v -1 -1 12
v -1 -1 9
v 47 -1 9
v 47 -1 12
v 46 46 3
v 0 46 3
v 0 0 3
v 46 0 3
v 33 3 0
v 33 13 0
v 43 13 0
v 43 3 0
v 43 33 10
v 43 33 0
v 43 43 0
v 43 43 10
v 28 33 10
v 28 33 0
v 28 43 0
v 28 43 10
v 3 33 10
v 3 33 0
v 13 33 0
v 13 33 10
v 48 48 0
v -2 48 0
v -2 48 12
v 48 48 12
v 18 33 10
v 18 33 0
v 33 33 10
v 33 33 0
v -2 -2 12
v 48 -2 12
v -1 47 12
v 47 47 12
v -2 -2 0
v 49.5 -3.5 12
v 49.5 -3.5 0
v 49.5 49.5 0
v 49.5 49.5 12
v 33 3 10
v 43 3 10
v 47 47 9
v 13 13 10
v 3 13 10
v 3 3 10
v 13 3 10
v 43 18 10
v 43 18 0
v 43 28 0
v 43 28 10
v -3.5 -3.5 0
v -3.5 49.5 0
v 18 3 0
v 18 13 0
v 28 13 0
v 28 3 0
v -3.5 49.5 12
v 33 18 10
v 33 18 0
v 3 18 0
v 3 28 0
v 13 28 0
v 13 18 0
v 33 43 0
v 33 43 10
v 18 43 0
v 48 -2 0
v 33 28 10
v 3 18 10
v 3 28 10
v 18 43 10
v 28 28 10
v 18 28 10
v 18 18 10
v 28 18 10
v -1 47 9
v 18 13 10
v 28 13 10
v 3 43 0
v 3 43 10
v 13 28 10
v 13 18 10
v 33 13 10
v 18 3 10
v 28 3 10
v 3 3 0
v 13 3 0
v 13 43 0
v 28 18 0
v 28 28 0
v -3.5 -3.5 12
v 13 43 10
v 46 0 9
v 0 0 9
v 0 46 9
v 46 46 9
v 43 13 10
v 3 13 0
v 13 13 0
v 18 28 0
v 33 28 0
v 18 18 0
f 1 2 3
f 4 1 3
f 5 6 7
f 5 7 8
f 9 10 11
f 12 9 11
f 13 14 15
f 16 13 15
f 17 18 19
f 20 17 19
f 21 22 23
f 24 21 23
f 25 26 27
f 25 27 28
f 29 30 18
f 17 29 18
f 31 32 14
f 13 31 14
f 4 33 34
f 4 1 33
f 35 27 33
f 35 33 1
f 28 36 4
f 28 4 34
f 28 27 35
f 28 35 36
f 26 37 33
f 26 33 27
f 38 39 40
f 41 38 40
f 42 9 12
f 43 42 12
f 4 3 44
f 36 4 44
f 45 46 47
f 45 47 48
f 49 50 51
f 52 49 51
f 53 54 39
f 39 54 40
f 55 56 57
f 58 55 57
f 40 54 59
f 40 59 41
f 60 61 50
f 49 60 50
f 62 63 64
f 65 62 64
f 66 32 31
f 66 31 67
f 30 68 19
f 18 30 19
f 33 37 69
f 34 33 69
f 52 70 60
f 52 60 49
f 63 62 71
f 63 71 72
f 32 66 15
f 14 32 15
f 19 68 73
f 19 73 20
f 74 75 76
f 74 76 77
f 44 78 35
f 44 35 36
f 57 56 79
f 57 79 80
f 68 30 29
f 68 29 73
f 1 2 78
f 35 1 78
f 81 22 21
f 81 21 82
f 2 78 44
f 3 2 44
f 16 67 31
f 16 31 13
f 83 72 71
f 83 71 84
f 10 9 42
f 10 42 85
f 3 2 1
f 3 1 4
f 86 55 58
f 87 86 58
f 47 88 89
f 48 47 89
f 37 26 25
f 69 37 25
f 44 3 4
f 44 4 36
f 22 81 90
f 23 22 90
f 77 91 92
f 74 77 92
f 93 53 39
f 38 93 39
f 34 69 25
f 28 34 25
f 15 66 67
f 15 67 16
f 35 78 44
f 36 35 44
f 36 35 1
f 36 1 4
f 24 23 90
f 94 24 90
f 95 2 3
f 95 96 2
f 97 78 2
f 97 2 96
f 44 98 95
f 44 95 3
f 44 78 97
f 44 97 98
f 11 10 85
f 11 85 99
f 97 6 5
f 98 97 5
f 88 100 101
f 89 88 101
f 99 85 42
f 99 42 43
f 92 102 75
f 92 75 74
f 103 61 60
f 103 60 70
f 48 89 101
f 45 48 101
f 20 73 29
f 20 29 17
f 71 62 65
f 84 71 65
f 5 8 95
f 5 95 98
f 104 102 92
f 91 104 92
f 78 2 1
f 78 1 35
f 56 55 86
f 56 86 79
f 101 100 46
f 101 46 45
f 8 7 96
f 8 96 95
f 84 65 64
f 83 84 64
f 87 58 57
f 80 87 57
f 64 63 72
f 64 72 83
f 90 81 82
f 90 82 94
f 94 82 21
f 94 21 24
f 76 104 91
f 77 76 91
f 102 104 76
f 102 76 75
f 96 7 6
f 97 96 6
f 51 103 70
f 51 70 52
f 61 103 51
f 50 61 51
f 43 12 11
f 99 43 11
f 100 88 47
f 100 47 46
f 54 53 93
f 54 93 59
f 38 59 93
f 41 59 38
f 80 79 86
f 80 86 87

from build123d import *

# Parameters (mm, degrees)
BOX001_W     = 10
BOX001_H     = 10
BOX001_DEPTH = 10
BOX002_W     = 10
BOX002_H     = 10
BOX002_DEPTH = 10
BOX003_W     = 10
BOX003_H     = 10
BOX003_DEPTH = 10
BOX004_W     = 10
BOX004_H     = 10
BOX004_DEPTH = 10
BOX005_W     = 10
BOX005_H     = 10
BOX005_DEPTH = 10
BOX006_W     = 10
BOX006_H     = 10
BOX006_DEPTH = 10
BOX007_W     = 10
BOX007_H     = 10
BOX007_DEPTH = 10
BOX008_W     = 10
BOX008_H     = 10
BOX008_DEPTH = 10
BOX009_W     = 10
BOX009_H     = 10
BOX009_DEPTH = 10
BOX012_W     = 48
BOX012_H     = 48
BOX012_DEPTH = 3
BOX011_W     = 48
BOX011_H     = 48
BOX011_DEPTH = 3
BOX_W        = 46
BOX_H        = 46
BOX_DEPTH    = 9
BOX010_W     = 50
BOX010_H     = 50
BOX010_DEPTH = 12
BOX013_W     = 53
BOX013_H     = 53
BOX013_DEPTH = 12


with BuildPart() as cube001:
    # Box001 → Box001 (new body)
    with BuildSketch(Plane(origin=(3, 3, 0), x_dir=(1, 0, 0), z_dir=(0, 0, 1))):
        with Locations((5, 5)):
            Rectangle(BOX001_W, BOX001_H)
    extrude(amount=BOX001_DEPTH)


with BuildPart() as cube002:
    # Box002 → Box002 (new body)
    with BuildSketch(Plane(origin=(18, 3, 0), x_dir=(1, 0, 0), z_dir=(0, 0, 1))):
        with Locations((5, 5)):
            Rectangle(BOX002_W, BOX002_H)
    extrude(amount=BOX002_DEPTH)


with BuildPart() as cube003:
    # Box003 → Box003 (new body)
    with BuildSketch(Plane(origin=(33, 3, 0), x_dir=(1, 0, 0), z_dir=(0, 0, 1))):
        with Locations((5, 5)):
            Rectangle(BOX003_W, BOX003_H)
    extrude(amount=BOX003_DEPTH)


with BuildPart() as cube004:
    # Box004 → Box004 (new body)
    with BuildSketch(Plane(origin=(3, 18, 0), x_dir=(1, 0, 0), z_dir=(0, 0, 1))):
        with Locations((5, 5)):
            Rectangle(BOX004_W, BOX004_H)
    extrude(amount=BOX004_DEPTH)


with BuildPart() as cube005:
    # Box005 → Box005 (new body)
    with BuildSketch(Plane(origin=(18, 18, 0), x_dir=(1, 0, 0), z_dir=(0, 0, 1))):
        with Locations((5, 5)):
            Rectangle(BOX005_W, BOX005_H)
    extrude(amount=BOX005_DEPTH)


with BuildPart() as cube006:
    # Box006 → Box006 (new body)
    with BuildSketch(Plane(origin=(33, 18, 0), x_dir=(1, 0, 0), z_dir=(0, 0, 1))):
        with Locations((5, 5)):
            Rectangle(BOX006_W, BOX006_H)
    extrude(amount=BOX006_DEPTH)


with BuildPart() as cube007:
    # Box007 → Box007 (new body)
    with BuildSketch(Plane(origin=(3, 33, 0), x_dir=(1, 0, 0), z_dir=(0, 0, 1))):
        with Locations((5, 5)):
            Rectangle(BOX007_W, BOX007_H)
    extrude(amount=BOX007_DEPTH)


with BuildPart() as cube008:
    # Box008 → Box008 (new body)
    with BuildSketch(Plane(origin=(18, 33, 0), x_dir=(1, 0, 0), z_dir=(0, 0, 1))):
        with Locations((5, 5)):
            Rectangle(BOX008_W, BOX008_H)
    extrude(amount=BOX008_DEPTH)


with BuildPart() as cube009:
    # Box009 → Box009 (new body)
    with BuildSketch(Plane(origin=(33, 33, 0), x_dir=(1, 0, 0), z_dir=(0, 0, 1))):
        with Locations((5, 5)):
            Rectangle(BOX009_W, BOX009_H)
    extrude(amount=BOX009_DEPTH)


with BuildPart() as cube012:
    # Box012 → Box012 (new body)
    with BuildSketch(Plane(origin=(-1, -1, 9), x_dir=(1, 0, 0), z_dir=(0, 0, 1))):
        with Locations((24, 24)):
            Rectangle(BOX012_W, BOX012_H)
    extrude(amount=BOX012_DEPTH)


with BuildPart() as cube011:
    # Box011 → Box011 (new body)
    with BuildSketch(Plane(origin=(-1, -1, 9), x_dir=(1, 0, 0), z_dir=(0, 0, 1))):
        with Locations((24, 24)):
            Rectangle(BOX011_W, BOX011_H)
    extrude(amount=BOX011_DEPTH)


with BuildPart() as cube:
    # Box → Box (new body)
    with BuildSketch(Plane.XY.offset(3)):
        with Locations((23, 23)):
            Rectangle(BOX_W, BOX_H)
    extrude(amount=BOX_DEPTH)


with BuildPart() as cut001:
    # Box010 → Box010 (new body)
    with BuildSketch(Plane(origin=(-2, -2, 0), x_dir=(1, 0, 0), z_dir=(0, 0, 1))):
        with Locations((25, 25)):
            Rectangle(BOX010_W, BOX010_H)
    extrude(amount=BOX010_DEPTH)

    # Cut: cut Cube
    add(cube.part, mode=Mode.SUBTRACT)

    # Cut001: cut Cube011
    add(cube011.part, mode=Mode.SUBTRACT)


with BuildPart() as cube013:
    # Box013 → Box013 (new body)
    with BuildSketch(Plane(origin=(-3.5, -3.5, 0), x_dir=(1, 0, 0), z_dir=(0, 0, 1))):
        with Locations((26.5, 26.5)):
            Rectangle(BOX013_W, BOX013_H)
    extrude(amount=BOX013_DEPTH)


solid = Compound([cube001.part, cube002.part, cube003.part, cube004.part, cube005.part, cube006.part, cube007.part, cube008.part, cube009.part, cube012.part, cut001.part, cube013.part])
